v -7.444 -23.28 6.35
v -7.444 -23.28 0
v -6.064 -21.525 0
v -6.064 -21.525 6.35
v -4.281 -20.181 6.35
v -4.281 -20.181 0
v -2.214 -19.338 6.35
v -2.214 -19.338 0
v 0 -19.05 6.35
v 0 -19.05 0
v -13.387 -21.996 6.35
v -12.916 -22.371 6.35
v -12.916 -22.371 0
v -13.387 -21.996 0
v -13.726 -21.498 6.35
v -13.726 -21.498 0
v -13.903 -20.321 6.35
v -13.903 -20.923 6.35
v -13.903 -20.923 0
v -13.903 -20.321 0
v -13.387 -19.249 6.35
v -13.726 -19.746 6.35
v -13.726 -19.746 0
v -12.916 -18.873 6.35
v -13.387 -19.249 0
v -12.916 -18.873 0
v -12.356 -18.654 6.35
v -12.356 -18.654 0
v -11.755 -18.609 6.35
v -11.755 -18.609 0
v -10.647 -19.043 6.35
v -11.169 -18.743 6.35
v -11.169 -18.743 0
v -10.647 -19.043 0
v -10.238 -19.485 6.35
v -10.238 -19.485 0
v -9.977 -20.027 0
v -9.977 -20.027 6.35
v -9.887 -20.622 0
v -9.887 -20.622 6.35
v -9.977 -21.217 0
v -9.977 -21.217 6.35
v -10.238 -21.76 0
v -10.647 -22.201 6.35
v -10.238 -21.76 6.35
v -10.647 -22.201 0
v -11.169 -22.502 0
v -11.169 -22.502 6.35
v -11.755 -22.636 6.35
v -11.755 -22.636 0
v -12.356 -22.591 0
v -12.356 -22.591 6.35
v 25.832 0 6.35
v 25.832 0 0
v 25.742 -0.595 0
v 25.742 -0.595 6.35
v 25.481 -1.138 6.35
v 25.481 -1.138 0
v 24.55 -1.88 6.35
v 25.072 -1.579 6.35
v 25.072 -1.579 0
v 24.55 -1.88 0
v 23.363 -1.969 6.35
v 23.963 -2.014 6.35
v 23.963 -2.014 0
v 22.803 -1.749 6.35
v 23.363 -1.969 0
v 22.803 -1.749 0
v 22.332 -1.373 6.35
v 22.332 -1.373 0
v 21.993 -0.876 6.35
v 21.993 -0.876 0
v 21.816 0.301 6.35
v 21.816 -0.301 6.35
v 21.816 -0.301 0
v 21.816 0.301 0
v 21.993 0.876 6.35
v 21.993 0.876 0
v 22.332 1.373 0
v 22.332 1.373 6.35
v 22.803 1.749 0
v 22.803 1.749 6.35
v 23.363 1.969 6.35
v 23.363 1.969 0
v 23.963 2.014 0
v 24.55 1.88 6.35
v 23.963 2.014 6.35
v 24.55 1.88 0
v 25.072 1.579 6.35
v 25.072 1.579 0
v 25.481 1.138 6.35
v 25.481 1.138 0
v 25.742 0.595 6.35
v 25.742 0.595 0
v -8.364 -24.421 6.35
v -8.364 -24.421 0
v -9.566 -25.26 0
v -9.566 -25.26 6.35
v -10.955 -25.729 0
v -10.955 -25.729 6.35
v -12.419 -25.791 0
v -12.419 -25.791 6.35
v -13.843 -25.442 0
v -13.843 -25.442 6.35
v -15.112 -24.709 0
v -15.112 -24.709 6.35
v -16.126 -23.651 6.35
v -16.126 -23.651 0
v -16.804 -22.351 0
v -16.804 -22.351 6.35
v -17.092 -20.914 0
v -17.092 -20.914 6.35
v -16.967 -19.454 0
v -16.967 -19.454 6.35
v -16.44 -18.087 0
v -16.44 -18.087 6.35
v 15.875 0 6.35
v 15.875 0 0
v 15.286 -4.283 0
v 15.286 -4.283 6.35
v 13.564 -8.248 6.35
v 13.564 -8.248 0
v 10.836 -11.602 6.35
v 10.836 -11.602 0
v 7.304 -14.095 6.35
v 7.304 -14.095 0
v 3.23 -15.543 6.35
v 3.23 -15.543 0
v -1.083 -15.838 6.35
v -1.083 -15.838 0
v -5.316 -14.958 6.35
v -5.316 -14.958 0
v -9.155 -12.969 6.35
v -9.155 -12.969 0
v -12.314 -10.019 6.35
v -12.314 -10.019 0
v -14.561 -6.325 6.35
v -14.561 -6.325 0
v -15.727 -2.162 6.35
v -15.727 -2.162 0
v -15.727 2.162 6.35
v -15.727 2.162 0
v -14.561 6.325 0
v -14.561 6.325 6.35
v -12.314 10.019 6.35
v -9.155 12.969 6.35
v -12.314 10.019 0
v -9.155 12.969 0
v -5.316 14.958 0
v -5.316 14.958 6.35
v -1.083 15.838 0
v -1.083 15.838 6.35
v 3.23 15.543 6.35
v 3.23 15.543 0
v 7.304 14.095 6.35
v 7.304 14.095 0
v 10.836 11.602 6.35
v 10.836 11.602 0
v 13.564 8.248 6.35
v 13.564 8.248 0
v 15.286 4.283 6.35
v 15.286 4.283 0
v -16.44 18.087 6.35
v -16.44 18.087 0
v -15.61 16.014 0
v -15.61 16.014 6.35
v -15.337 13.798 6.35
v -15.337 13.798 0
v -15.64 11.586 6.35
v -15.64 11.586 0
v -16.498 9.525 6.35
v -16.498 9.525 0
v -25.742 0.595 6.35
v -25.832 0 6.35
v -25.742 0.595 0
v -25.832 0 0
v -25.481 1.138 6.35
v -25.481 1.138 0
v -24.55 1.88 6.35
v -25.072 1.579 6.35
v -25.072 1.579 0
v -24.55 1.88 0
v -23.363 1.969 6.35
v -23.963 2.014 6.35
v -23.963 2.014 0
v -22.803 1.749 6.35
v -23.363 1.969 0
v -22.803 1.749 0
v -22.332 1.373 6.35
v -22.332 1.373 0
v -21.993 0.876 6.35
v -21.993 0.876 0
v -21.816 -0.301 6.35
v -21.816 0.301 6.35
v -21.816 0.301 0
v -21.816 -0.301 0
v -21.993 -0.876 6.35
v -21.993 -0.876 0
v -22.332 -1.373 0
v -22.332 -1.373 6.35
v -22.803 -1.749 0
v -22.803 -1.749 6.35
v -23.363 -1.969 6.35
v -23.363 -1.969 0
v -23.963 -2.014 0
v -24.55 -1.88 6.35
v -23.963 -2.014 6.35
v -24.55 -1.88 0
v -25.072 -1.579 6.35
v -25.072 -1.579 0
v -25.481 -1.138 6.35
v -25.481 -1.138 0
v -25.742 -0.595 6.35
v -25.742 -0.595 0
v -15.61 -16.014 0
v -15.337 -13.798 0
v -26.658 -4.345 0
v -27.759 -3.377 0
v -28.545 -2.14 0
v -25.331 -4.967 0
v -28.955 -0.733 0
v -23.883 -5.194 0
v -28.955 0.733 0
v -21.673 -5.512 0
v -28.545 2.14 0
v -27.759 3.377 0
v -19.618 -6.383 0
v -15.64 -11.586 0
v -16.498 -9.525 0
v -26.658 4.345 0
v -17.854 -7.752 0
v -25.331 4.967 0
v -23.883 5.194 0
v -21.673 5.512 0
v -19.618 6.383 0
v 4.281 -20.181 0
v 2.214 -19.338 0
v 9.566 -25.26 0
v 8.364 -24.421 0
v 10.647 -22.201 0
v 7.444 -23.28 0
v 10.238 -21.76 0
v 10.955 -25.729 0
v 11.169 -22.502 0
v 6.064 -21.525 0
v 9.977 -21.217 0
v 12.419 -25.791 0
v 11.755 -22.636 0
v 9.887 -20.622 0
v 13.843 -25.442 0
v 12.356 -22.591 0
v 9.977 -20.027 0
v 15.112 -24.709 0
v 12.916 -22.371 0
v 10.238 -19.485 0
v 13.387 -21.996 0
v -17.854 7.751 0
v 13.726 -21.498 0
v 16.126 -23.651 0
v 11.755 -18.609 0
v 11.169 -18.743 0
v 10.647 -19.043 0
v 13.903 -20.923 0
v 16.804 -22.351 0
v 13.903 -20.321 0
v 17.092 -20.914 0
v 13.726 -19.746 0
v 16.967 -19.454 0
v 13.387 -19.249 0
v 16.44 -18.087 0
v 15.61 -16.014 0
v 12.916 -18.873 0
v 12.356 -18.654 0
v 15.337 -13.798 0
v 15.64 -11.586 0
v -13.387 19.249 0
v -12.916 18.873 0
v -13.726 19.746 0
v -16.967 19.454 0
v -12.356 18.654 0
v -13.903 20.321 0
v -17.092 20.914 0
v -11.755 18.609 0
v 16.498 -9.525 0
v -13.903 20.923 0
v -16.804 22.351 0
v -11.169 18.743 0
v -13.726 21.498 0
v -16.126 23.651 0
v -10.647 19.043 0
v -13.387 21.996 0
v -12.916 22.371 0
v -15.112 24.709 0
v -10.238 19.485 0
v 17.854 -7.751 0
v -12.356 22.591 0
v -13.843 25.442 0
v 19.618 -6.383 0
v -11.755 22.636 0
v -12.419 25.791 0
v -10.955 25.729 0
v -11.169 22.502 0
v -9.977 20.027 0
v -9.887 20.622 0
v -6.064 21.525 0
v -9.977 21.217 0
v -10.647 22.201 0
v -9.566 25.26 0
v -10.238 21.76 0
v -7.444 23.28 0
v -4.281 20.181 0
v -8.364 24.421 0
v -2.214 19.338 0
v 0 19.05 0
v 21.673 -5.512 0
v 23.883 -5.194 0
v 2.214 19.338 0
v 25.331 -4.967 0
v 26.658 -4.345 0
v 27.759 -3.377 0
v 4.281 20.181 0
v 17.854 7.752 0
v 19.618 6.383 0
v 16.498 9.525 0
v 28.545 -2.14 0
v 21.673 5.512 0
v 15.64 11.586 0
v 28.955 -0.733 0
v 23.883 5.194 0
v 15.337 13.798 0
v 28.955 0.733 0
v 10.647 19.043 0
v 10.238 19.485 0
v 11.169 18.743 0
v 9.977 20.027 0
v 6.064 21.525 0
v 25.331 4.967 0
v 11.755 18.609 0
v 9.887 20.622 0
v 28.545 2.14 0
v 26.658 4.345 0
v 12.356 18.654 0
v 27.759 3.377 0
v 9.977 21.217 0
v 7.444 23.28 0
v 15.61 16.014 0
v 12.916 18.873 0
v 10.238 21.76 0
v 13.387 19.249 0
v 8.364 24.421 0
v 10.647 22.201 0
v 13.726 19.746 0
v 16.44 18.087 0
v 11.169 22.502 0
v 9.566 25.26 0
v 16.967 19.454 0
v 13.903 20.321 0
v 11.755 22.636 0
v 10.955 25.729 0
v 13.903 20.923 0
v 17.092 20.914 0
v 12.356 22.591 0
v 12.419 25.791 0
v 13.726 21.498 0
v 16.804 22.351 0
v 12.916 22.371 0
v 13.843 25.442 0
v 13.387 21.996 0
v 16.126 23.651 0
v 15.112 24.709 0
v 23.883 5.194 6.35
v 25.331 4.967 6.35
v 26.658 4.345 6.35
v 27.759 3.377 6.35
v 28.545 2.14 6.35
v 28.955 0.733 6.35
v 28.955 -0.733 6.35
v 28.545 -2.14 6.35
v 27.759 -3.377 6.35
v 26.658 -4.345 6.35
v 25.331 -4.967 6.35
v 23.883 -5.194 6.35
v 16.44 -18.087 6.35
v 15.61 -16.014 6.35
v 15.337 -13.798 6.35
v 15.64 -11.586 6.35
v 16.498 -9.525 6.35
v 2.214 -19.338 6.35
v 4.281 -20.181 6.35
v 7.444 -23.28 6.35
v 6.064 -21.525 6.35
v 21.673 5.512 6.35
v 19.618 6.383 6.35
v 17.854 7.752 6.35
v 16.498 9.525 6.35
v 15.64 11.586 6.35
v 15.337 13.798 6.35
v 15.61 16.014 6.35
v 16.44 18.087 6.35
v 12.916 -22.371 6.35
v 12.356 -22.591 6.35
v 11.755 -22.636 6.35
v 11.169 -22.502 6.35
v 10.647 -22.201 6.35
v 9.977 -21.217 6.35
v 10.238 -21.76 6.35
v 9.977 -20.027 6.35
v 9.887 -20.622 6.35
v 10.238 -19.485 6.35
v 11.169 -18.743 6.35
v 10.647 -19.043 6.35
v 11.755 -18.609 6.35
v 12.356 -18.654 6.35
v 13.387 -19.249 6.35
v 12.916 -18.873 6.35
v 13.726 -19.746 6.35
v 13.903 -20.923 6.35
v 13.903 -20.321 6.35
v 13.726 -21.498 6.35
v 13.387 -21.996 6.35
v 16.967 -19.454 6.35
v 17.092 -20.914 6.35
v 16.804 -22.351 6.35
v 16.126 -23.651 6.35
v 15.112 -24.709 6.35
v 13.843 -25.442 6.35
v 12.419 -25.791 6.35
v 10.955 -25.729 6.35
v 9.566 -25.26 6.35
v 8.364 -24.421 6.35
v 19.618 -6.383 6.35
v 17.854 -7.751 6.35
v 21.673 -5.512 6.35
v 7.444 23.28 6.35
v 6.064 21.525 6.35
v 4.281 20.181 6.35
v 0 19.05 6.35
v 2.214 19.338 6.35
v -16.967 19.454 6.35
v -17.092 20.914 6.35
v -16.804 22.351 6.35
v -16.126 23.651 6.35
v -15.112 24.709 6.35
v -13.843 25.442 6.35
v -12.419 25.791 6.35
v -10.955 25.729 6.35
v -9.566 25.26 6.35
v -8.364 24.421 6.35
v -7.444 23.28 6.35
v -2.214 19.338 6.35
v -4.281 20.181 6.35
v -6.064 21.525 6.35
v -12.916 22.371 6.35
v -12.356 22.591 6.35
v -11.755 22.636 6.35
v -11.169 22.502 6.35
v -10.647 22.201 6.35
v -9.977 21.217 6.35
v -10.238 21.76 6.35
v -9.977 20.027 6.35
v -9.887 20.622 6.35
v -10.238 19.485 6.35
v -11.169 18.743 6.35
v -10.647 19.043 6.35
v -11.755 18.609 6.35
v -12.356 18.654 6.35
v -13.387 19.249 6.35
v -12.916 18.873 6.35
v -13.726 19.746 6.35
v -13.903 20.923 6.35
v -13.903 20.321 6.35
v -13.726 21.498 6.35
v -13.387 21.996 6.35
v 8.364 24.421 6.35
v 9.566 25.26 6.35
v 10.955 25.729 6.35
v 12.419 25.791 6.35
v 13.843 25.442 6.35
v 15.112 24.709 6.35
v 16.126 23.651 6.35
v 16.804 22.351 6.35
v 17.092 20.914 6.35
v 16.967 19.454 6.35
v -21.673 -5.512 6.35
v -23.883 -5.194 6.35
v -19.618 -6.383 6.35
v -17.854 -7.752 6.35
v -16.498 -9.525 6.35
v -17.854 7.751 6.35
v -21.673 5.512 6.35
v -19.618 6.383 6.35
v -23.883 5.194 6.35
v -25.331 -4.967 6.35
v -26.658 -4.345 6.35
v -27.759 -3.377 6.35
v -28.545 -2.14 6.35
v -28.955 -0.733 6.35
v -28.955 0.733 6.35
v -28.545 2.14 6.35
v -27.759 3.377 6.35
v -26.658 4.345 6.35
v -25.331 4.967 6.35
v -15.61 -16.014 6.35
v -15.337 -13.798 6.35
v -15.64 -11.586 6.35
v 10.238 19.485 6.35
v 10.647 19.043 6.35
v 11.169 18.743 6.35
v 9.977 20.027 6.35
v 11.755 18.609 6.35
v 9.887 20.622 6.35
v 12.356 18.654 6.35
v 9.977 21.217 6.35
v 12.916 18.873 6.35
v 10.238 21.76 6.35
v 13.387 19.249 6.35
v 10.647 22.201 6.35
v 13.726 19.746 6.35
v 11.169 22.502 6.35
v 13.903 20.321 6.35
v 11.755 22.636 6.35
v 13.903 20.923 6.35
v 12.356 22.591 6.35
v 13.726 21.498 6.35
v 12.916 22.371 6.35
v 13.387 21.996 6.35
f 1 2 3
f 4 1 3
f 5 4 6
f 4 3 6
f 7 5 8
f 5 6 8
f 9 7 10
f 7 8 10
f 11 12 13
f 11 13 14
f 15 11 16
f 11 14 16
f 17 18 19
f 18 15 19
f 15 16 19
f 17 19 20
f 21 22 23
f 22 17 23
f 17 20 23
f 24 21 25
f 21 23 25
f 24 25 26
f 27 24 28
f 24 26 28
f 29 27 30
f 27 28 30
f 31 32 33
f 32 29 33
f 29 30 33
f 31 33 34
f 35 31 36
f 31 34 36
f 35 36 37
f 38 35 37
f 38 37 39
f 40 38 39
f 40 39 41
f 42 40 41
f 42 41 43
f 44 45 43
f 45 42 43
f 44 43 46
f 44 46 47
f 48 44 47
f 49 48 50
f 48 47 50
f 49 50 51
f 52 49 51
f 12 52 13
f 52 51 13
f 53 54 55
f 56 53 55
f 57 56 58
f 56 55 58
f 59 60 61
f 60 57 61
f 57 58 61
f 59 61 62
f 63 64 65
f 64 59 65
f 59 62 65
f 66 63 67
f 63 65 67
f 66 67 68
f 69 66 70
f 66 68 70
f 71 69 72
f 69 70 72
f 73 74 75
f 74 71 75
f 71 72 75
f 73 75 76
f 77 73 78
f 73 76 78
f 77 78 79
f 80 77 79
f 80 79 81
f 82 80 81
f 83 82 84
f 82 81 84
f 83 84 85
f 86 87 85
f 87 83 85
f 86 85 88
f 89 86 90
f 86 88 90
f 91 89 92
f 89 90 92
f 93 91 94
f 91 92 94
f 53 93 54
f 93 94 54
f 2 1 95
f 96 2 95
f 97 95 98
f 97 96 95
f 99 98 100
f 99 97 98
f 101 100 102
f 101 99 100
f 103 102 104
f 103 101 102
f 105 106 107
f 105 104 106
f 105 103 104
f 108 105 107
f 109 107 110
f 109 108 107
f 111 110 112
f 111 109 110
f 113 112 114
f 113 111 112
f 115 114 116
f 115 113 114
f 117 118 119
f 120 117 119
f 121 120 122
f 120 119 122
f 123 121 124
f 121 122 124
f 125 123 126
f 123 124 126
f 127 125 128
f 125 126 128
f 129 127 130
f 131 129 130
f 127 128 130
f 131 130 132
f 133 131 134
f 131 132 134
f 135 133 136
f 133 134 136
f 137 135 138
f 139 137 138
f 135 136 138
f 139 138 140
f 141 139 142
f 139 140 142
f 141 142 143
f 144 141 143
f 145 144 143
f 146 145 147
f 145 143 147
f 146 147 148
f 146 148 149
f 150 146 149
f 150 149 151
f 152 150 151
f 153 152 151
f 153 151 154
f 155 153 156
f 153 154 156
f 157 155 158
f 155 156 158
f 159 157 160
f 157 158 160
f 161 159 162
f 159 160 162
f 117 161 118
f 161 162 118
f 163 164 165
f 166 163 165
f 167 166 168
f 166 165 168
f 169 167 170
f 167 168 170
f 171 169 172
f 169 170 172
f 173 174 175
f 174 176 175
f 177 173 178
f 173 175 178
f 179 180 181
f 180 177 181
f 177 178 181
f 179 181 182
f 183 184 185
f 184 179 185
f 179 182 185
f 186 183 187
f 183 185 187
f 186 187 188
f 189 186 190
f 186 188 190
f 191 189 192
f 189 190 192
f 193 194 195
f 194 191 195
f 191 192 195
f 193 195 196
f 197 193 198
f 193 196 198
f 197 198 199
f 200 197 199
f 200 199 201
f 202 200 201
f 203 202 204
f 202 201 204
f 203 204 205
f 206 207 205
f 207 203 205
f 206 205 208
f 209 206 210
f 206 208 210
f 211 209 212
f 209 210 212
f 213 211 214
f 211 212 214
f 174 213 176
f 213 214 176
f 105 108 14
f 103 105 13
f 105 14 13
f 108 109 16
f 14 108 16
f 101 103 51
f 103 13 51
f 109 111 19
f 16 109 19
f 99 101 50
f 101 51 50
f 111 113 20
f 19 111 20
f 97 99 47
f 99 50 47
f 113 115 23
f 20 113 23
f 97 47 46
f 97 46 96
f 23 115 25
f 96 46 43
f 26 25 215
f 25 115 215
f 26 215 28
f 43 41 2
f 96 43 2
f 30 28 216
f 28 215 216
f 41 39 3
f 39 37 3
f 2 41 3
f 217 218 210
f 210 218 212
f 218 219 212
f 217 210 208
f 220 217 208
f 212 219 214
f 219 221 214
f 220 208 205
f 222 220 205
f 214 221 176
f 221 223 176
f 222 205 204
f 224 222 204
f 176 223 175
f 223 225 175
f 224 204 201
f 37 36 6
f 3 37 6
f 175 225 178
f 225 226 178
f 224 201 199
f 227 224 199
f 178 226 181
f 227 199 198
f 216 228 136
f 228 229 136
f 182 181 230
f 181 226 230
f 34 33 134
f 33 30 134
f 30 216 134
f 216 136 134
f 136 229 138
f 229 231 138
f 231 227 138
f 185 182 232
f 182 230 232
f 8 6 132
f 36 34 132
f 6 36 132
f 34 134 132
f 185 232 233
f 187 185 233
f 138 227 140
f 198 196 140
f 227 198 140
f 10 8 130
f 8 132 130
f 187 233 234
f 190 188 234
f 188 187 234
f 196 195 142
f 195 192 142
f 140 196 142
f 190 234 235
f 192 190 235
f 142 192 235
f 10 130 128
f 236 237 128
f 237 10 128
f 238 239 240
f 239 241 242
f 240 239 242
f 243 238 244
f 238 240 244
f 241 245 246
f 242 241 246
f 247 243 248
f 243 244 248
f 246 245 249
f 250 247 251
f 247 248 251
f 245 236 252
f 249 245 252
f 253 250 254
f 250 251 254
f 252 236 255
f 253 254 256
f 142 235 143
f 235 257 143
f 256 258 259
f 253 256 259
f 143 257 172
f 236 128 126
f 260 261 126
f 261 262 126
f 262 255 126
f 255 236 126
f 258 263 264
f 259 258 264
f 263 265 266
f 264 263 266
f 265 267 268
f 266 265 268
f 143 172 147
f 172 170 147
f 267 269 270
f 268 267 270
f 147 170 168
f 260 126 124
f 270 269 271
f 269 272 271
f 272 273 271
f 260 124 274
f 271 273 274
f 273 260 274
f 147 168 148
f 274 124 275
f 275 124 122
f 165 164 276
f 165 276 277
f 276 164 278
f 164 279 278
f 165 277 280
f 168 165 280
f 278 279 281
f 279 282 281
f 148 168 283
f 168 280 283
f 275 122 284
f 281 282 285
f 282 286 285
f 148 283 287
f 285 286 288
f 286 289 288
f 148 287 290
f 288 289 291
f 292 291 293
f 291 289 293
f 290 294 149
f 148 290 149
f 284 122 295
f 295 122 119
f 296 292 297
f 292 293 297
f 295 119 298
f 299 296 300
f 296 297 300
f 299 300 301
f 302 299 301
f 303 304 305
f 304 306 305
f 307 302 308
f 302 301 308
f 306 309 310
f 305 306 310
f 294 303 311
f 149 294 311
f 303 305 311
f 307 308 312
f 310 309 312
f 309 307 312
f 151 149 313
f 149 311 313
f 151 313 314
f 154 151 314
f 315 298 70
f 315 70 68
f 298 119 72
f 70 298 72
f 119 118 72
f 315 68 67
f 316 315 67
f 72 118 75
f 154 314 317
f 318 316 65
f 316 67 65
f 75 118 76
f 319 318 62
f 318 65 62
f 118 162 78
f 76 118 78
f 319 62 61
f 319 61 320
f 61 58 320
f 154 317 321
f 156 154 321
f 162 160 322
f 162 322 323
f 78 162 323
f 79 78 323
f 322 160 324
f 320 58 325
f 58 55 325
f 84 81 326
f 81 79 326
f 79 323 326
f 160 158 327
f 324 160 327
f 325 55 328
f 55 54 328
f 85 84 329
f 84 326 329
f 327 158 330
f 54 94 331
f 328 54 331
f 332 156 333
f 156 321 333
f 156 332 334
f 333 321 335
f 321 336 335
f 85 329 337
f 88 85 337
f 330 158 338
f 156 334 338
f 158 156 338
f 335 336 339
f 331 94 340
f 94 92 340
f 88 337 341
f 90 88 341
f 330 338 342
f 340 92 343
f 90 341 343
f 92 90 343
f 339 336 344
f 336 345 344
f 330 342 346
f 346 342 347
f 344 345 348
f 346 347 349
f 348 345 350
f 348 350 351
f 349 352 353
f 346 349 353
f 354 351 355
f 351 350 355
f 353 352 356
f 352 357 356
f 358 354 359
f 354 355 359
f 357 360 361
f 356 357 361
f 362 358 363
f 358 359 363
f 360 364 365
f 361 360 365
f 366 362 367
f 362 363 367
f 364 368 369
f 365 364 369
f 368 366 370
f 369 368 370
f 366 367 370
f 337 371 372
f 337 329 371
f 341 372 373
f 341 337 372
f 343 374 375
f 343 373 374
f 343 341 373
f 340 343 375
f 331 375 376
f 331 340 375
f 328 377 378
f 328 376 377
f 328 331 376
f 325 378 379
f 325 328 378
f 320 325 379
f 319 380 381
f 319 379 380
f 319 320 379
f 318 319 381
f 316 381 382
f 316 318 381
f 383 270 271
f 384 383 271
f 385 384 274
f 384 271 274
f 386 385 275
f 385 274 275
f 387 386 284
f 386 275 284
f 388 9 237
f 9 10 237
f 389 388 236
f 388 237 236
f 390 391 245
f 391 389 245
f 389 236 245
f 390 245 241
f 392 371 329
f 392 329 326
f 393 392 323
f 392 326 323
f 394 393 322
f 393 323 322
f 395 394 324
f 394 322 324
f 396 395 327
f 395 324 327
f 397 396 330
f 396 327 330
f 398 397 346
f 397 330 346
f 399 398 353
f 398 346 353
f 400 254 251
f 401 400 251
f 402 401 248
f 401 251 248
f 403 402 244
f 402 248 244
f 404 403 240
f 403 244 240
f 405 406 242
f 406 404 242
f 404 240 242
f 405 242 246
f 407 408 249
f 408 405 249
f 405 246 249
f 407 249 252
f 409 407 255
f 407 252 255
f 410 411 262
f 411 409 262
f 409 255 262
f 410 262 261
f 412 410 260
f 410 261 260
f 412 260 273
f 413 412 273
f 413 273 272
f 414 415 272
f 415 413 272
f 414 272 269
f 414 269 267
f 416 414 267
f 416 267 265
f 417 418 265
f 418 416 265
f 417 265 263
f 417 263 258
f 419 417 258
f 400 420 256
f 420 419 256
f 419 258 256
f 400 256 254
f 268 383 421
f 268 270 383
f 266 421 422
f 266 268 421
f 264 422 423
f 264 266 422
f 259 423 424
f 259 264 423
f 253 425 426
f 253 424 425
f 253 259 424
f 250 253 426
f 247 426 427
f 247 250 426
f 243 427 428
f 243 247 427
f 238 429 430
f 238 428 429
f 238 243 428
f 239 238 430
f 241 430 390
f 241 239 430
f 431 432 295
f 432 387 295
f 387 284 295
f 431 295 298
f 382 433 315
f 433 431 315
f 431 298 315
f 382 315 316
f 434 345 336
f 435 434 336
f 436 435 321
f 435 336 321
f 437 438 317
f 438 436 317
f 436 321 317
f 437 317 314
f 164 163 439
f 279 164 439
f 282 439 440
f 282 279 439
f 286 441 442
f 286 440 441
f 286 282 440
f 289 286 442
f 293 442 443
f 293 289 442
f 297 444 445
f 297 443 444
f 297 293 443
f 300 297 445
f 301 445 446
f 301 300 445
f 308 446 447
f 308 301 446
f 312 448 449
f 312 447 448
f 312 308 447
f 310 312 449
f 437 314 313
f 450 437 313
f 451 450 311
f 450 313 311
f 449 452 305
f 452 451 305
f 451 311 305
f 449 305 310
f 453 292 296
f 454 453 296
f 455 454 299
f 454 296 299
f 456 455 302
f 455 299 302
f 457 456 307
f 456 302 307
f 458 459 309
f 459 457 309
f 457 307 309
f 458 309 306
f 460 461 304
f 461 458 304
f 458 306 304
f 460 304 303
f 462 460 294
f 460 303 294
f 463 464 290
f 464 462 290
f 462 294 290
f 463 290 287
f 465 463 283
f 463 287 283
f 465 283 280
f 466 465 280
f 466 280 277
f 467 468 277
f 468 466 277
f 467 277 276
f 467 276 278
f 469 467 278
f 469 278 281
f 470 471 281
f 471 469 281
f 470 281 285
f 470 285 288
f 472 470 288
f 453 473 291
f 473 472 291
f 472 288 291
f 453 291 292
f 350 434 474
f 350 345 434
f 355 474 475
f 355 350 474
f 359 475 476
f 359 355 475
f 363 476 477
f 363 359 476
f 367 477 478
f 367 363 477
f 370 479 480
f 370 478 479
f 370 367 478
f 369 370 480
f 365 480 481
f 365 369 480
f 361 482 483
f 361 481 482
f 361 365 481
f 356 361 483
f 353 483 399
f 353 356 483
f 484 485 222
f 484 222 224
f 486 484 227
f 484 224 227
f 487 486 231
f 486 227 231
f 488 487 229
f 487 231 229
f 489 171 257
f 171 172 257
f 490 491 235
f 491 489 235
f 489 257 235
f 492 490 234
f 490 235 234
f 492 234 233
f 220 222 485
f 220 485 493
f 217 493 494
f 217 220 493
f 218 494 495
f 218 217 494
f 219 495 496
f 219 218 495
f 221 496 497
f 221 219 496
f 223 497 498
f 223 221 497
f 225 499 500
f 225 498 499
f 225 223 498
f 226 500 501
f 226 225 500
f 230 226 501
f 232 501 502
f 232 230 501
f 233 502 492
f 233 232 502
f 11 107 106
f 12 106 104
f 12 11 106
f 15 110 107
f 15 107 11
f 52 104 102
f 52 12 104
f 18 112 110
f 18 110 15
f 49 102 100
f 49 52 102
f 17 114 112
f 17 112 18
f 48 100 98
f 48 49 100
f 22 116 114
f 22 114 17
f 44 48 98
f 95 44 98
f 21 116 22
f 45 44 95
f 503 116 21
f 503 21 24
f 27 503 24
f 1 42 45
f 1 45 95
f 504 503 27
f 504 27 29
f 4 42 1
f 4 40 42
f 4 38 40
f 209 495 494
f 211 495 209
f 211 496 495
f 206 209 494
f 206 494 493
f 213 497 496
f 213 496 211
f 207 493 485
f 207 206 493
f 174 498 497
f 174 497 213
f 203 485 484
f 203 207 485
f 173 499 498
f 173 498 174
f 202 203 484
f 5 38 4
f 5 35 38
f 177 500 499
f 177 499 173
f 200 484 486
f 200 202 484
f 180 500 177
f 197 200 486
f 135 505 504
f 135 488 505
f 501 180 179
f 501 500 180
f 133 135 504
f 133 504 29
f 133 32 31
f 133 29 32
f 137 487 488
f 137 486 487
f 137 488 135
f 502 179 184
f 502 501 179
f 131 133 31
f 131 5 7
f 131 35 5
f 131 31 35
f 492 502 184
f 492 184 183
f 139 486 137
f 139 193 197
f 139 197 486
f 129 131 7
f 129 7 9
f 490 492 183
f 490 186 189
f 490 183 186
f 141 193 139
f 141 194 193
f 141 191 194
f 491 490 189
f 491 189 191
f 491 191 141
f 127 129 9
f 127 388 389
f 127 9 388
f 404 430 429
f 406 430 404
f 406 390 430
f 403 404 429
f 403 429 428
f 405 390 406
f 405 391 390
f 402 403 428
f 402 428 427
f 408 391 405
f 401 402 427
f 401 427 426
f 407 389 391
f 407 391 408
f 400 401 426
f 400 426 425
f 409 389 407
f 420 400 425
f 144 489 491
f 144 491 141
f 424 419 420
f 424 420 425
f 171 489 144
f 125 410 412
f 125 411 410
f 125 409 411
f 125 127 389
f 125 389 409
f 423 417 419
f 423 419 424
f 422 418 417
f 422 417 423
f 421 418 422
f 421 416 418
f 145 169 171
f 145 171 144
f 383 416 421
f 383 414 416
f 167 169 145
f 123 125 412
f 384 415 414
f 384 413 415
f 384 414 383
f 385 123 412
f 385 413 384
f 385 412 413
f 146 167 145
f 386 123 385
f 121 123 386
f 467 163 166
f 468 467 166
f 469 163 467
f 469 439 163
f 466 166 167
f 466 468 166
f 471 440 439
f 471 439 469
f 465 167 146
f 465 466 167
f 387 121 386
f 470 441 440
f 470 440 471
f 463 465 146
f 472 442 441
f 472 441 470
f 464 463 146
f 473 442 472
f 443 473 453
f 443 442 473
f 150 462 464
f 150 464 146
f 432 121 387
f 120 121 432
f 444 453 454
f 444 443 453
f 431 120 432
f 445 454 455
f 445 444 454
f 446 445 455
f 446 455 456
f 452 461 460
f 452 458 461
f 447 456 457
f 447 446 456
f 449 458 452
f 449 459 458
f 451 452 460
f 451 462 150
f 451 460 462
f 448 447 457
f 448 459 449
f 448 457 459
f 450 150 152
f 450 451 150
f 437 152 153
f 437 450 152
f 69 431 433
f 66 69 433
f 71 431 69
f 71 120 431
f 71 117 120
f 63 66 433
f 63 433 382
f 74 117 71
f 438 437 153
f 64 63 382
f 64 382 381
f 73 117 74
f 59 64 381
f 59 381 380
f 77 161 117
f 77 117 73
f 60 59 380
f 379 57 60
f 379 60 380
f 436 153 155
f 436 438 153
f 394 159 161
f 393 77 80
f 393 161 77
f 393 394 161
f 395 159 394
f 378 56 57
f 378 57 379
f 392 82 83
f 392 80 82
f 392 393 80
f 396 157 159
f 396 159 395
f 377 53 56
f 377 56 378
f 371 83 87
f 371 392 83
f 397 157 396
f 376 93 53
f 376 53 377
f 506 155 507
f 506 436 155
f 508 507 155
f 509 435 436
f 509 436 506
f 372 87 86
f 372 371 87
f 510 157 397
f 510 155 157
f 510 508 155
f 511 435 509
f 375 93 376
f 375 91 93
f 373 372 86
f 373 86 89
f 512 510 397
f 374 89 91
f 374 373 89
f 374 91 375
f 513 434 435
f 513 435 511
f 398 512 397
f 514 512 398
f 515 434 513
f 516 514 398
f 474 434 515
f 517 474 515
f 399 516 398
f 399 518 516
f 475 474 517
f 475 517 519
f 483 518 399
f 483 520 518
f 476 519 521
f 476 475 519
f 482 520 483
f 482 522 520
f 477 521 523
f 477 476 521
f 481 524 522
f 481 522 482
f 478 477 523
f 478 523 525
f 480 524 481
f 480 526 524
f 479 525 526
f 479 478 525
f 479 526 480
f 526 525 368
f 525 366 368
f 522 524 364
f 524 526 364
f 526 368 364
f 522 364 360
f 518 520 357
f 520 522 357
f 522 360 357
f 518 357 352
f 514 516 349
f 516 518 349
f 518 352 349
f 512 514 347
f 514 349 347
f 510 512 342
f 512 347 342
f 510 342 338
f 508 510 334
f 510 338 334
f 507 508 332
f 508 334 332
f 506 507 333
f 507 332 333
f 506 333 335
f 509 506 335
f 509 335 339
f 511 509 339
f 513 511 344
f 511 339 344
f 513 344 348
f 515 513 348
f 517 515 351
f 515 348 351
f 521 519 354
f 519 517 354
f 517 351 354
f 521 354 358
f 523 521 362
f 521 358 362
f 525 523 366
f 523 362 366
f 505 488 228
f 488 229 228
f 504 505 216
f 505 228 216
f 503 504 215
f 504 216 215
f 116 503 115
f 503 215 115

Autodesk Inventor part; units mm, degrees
ref_plane "YZ Plane" through (0, 0, 0) normal (1, 0, 0) x (0, 1, 0)
ref_plane "XZ Plane" through (0, 0, 0) normal (0, 1, 0) x (-1, 0, 0)
ref_plane "XY Plane" through (0, 0, 0) normal (0, 0, 1) x (1, 0, 0)
sketch "Sketch1" plane through (0, 0, 0) normal (0, 0, 1) x (1, 0, 0)
  circle A0 centre (0, 0) radius 19.05
  circle A1 centre (23.8125, 0) radius 2.0193
  arc A2 (23.8832, -5.1938) -> (23.8832, 5.1938) centre (23.8125, 0) ccw
  arc A3 (16.4978, 9.525) -> (23.8832, 5.1938) centre (24.001, 13.857) ccw
  arc A4 (23.8832, -5.1938) -> (16.4978, -9.525) centre (24.001, -13.857) ccw
  circle A5 centre (11.9063, 20.6222) radius 2.0193
  arc A6 (16.4396, 18.0865) -> (7.4436, 23.2803) centre (11.9063, 20.6222) ccw
  arc A7 (0, 19.05) -> (7.4436, 23.2803) centre (0, 27.714) ccw
  arc A8 (16.4396, 18.0865) -> (16.4978, 9.525) centre (24.001, 13.857) ccw
  circle A9 centre (-11.9062, 20.6222) radius 2.0193
  arc A10 (-7.4436, 23.2803) -> (-16.4396, 18.0865) centre (-11.9062, 20.6222) ccw
  arc A11 (-16.4978, 9.525) -> (-16.4396, 18.0865) centre (-24.001, 13.857) ccw
  arc A12 (-7.4436, 23.2803) -> (0, 19.05) centre (0, 27.714) ccw
  circle A13 centre (-23.8125, 0) radius 2.0193
  arc A14 (-23.8832, 5.1938) -> (-23.8832, -5.1938) centre (-23.8125, 0) ccw
  arc A15 (-16.4978, -9.525) -> (-23.8832, -5.1938) centre (-24.001, -13.857) ccw
  arc A16 (-23.8832, 5.1938) -> (-16.4978, 9.525) centre (-24.001, 13.857) ccw
  circle A17 centre (-11.9063, -20.6222) radius 2.0193
  arc A18 (-16.4396, -18.0865) -> (-7.4436, -23.2803) centre (-11.9063, -20.6222) ccw
  arc A19 (0, -19.05) -> (-7.4436, -23.2803) centre (0, -27.714) ccw
  arc A20 (-16.4396, -18.0865) -> (-16.4978, -9.525) centre (-24.001, -13.857) ccw
  circle A21 centre (11.9062, -20.6222) radius 2.0193
  arc A22 (7.4436, -23.2803) -> (16.4396, -18.0865) centre (11.9062, -20.6222) ccw
  arc A23 (16.4978, -9.525) -> (16.4396, -18.0865) centre (24.001, -13.857) ccw
  arc A24 (7.4436, -23.2803) -> (0, -19.05) centre (0, -27.714) ccw
  circle A25 centre (0, 0) radius 15.875
  dimension "d0" = 38.1
  dimension "d1" = 4.0386
  dimension "d2" = 3.175
  dimension "d3" = 23.8125
  dimension "d4" = 8.664
  dimension "d7" = 360
  dimension "d9" = 31.75
extrude "Extrusion1" add sketch "Sketch1" along normal blind 6.35 contours A0 | A0 A3 A2 A4
pattern_circular "Circular Pattern1" count 6 over 360 about axis through (0, 0, 0) along (0, 0, 1) of "Extrusion1"
properties part number "Standardized Plate Spacer" material "Aluminum 6061"
